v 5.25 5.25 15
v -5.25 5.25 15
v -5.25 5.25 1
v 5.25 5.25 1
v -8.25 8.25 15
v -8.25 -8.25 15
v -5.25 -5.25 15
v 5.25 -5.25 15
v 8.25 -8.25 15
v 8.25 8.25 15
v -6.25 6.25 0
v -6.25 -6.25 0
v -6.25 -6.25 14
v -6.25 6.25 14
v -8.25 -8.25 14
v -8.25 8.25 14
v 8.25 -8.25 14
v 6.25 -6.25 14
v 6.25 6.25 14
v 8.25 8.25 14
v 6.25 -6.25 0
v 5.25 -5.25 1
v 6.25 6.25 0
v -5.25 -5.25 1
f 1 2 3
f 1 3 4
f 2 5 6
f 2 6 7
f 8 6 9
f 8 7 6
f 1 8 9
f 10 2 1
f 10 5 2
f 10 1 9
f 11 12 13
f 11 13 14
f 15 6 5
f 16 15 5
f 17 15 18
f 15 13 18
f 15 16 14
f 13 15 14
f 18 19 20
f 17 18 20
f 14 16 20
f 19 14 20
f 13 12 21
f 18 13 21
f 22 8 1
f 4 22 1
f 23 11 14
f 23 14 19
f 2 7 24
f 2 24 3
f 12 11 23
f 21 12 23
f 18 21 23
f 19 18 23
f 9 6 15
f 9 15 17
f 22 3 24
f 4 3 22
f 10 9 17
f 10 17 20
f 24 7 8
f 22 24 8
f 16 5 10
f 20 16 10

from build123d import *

# Parameters (mm, degrees)
SKETCH1_W           = 12.5
SKETCH1_H           = 12.5
BOSS_EXTRUDE1_DEPTH = 15
SHELL3_T            = -1
SKETCH2_W           = 16.5
SKETCH2_H           = 16.5
SKETCH2_W_2         = 12.5
SKETCH2_H_2         = 12.5
BOSS_EXTRUDE2_DEPTH = 1


with BuildPart() as part:
    # Sketch1 → Boss-Extrude1 (new body)
    with BuildSketch(Plane.XY):
        Rectangle(SKETCH1_W, SKETCH1_H)
    extrude(amount=BOSS_EXTRUDE1_DEPTH)

    # Shell3
    shell3_openings = [part.faces().sort_by_distance(p)[0] for p in [
        (0, 0, 15),
    ]]
    offset(amount=SHELL3_T, openings=shell3_openings, kind=Kind.INTERSECTION)

    # Sketch2 → Boss-Extrude2 (add)
    with BuildSketch(Plane.XY.offset(15)):
        Rectangle(SKETCH2_W, SKETCH2_H)
        Rectangle(SKETCH2_W_2, SKETCH2_H_2, mode=Mode.SUBTRACT)
    extrude(amount=-BOSS_EXTRUDE2_DEPTH)


solid = part.part
